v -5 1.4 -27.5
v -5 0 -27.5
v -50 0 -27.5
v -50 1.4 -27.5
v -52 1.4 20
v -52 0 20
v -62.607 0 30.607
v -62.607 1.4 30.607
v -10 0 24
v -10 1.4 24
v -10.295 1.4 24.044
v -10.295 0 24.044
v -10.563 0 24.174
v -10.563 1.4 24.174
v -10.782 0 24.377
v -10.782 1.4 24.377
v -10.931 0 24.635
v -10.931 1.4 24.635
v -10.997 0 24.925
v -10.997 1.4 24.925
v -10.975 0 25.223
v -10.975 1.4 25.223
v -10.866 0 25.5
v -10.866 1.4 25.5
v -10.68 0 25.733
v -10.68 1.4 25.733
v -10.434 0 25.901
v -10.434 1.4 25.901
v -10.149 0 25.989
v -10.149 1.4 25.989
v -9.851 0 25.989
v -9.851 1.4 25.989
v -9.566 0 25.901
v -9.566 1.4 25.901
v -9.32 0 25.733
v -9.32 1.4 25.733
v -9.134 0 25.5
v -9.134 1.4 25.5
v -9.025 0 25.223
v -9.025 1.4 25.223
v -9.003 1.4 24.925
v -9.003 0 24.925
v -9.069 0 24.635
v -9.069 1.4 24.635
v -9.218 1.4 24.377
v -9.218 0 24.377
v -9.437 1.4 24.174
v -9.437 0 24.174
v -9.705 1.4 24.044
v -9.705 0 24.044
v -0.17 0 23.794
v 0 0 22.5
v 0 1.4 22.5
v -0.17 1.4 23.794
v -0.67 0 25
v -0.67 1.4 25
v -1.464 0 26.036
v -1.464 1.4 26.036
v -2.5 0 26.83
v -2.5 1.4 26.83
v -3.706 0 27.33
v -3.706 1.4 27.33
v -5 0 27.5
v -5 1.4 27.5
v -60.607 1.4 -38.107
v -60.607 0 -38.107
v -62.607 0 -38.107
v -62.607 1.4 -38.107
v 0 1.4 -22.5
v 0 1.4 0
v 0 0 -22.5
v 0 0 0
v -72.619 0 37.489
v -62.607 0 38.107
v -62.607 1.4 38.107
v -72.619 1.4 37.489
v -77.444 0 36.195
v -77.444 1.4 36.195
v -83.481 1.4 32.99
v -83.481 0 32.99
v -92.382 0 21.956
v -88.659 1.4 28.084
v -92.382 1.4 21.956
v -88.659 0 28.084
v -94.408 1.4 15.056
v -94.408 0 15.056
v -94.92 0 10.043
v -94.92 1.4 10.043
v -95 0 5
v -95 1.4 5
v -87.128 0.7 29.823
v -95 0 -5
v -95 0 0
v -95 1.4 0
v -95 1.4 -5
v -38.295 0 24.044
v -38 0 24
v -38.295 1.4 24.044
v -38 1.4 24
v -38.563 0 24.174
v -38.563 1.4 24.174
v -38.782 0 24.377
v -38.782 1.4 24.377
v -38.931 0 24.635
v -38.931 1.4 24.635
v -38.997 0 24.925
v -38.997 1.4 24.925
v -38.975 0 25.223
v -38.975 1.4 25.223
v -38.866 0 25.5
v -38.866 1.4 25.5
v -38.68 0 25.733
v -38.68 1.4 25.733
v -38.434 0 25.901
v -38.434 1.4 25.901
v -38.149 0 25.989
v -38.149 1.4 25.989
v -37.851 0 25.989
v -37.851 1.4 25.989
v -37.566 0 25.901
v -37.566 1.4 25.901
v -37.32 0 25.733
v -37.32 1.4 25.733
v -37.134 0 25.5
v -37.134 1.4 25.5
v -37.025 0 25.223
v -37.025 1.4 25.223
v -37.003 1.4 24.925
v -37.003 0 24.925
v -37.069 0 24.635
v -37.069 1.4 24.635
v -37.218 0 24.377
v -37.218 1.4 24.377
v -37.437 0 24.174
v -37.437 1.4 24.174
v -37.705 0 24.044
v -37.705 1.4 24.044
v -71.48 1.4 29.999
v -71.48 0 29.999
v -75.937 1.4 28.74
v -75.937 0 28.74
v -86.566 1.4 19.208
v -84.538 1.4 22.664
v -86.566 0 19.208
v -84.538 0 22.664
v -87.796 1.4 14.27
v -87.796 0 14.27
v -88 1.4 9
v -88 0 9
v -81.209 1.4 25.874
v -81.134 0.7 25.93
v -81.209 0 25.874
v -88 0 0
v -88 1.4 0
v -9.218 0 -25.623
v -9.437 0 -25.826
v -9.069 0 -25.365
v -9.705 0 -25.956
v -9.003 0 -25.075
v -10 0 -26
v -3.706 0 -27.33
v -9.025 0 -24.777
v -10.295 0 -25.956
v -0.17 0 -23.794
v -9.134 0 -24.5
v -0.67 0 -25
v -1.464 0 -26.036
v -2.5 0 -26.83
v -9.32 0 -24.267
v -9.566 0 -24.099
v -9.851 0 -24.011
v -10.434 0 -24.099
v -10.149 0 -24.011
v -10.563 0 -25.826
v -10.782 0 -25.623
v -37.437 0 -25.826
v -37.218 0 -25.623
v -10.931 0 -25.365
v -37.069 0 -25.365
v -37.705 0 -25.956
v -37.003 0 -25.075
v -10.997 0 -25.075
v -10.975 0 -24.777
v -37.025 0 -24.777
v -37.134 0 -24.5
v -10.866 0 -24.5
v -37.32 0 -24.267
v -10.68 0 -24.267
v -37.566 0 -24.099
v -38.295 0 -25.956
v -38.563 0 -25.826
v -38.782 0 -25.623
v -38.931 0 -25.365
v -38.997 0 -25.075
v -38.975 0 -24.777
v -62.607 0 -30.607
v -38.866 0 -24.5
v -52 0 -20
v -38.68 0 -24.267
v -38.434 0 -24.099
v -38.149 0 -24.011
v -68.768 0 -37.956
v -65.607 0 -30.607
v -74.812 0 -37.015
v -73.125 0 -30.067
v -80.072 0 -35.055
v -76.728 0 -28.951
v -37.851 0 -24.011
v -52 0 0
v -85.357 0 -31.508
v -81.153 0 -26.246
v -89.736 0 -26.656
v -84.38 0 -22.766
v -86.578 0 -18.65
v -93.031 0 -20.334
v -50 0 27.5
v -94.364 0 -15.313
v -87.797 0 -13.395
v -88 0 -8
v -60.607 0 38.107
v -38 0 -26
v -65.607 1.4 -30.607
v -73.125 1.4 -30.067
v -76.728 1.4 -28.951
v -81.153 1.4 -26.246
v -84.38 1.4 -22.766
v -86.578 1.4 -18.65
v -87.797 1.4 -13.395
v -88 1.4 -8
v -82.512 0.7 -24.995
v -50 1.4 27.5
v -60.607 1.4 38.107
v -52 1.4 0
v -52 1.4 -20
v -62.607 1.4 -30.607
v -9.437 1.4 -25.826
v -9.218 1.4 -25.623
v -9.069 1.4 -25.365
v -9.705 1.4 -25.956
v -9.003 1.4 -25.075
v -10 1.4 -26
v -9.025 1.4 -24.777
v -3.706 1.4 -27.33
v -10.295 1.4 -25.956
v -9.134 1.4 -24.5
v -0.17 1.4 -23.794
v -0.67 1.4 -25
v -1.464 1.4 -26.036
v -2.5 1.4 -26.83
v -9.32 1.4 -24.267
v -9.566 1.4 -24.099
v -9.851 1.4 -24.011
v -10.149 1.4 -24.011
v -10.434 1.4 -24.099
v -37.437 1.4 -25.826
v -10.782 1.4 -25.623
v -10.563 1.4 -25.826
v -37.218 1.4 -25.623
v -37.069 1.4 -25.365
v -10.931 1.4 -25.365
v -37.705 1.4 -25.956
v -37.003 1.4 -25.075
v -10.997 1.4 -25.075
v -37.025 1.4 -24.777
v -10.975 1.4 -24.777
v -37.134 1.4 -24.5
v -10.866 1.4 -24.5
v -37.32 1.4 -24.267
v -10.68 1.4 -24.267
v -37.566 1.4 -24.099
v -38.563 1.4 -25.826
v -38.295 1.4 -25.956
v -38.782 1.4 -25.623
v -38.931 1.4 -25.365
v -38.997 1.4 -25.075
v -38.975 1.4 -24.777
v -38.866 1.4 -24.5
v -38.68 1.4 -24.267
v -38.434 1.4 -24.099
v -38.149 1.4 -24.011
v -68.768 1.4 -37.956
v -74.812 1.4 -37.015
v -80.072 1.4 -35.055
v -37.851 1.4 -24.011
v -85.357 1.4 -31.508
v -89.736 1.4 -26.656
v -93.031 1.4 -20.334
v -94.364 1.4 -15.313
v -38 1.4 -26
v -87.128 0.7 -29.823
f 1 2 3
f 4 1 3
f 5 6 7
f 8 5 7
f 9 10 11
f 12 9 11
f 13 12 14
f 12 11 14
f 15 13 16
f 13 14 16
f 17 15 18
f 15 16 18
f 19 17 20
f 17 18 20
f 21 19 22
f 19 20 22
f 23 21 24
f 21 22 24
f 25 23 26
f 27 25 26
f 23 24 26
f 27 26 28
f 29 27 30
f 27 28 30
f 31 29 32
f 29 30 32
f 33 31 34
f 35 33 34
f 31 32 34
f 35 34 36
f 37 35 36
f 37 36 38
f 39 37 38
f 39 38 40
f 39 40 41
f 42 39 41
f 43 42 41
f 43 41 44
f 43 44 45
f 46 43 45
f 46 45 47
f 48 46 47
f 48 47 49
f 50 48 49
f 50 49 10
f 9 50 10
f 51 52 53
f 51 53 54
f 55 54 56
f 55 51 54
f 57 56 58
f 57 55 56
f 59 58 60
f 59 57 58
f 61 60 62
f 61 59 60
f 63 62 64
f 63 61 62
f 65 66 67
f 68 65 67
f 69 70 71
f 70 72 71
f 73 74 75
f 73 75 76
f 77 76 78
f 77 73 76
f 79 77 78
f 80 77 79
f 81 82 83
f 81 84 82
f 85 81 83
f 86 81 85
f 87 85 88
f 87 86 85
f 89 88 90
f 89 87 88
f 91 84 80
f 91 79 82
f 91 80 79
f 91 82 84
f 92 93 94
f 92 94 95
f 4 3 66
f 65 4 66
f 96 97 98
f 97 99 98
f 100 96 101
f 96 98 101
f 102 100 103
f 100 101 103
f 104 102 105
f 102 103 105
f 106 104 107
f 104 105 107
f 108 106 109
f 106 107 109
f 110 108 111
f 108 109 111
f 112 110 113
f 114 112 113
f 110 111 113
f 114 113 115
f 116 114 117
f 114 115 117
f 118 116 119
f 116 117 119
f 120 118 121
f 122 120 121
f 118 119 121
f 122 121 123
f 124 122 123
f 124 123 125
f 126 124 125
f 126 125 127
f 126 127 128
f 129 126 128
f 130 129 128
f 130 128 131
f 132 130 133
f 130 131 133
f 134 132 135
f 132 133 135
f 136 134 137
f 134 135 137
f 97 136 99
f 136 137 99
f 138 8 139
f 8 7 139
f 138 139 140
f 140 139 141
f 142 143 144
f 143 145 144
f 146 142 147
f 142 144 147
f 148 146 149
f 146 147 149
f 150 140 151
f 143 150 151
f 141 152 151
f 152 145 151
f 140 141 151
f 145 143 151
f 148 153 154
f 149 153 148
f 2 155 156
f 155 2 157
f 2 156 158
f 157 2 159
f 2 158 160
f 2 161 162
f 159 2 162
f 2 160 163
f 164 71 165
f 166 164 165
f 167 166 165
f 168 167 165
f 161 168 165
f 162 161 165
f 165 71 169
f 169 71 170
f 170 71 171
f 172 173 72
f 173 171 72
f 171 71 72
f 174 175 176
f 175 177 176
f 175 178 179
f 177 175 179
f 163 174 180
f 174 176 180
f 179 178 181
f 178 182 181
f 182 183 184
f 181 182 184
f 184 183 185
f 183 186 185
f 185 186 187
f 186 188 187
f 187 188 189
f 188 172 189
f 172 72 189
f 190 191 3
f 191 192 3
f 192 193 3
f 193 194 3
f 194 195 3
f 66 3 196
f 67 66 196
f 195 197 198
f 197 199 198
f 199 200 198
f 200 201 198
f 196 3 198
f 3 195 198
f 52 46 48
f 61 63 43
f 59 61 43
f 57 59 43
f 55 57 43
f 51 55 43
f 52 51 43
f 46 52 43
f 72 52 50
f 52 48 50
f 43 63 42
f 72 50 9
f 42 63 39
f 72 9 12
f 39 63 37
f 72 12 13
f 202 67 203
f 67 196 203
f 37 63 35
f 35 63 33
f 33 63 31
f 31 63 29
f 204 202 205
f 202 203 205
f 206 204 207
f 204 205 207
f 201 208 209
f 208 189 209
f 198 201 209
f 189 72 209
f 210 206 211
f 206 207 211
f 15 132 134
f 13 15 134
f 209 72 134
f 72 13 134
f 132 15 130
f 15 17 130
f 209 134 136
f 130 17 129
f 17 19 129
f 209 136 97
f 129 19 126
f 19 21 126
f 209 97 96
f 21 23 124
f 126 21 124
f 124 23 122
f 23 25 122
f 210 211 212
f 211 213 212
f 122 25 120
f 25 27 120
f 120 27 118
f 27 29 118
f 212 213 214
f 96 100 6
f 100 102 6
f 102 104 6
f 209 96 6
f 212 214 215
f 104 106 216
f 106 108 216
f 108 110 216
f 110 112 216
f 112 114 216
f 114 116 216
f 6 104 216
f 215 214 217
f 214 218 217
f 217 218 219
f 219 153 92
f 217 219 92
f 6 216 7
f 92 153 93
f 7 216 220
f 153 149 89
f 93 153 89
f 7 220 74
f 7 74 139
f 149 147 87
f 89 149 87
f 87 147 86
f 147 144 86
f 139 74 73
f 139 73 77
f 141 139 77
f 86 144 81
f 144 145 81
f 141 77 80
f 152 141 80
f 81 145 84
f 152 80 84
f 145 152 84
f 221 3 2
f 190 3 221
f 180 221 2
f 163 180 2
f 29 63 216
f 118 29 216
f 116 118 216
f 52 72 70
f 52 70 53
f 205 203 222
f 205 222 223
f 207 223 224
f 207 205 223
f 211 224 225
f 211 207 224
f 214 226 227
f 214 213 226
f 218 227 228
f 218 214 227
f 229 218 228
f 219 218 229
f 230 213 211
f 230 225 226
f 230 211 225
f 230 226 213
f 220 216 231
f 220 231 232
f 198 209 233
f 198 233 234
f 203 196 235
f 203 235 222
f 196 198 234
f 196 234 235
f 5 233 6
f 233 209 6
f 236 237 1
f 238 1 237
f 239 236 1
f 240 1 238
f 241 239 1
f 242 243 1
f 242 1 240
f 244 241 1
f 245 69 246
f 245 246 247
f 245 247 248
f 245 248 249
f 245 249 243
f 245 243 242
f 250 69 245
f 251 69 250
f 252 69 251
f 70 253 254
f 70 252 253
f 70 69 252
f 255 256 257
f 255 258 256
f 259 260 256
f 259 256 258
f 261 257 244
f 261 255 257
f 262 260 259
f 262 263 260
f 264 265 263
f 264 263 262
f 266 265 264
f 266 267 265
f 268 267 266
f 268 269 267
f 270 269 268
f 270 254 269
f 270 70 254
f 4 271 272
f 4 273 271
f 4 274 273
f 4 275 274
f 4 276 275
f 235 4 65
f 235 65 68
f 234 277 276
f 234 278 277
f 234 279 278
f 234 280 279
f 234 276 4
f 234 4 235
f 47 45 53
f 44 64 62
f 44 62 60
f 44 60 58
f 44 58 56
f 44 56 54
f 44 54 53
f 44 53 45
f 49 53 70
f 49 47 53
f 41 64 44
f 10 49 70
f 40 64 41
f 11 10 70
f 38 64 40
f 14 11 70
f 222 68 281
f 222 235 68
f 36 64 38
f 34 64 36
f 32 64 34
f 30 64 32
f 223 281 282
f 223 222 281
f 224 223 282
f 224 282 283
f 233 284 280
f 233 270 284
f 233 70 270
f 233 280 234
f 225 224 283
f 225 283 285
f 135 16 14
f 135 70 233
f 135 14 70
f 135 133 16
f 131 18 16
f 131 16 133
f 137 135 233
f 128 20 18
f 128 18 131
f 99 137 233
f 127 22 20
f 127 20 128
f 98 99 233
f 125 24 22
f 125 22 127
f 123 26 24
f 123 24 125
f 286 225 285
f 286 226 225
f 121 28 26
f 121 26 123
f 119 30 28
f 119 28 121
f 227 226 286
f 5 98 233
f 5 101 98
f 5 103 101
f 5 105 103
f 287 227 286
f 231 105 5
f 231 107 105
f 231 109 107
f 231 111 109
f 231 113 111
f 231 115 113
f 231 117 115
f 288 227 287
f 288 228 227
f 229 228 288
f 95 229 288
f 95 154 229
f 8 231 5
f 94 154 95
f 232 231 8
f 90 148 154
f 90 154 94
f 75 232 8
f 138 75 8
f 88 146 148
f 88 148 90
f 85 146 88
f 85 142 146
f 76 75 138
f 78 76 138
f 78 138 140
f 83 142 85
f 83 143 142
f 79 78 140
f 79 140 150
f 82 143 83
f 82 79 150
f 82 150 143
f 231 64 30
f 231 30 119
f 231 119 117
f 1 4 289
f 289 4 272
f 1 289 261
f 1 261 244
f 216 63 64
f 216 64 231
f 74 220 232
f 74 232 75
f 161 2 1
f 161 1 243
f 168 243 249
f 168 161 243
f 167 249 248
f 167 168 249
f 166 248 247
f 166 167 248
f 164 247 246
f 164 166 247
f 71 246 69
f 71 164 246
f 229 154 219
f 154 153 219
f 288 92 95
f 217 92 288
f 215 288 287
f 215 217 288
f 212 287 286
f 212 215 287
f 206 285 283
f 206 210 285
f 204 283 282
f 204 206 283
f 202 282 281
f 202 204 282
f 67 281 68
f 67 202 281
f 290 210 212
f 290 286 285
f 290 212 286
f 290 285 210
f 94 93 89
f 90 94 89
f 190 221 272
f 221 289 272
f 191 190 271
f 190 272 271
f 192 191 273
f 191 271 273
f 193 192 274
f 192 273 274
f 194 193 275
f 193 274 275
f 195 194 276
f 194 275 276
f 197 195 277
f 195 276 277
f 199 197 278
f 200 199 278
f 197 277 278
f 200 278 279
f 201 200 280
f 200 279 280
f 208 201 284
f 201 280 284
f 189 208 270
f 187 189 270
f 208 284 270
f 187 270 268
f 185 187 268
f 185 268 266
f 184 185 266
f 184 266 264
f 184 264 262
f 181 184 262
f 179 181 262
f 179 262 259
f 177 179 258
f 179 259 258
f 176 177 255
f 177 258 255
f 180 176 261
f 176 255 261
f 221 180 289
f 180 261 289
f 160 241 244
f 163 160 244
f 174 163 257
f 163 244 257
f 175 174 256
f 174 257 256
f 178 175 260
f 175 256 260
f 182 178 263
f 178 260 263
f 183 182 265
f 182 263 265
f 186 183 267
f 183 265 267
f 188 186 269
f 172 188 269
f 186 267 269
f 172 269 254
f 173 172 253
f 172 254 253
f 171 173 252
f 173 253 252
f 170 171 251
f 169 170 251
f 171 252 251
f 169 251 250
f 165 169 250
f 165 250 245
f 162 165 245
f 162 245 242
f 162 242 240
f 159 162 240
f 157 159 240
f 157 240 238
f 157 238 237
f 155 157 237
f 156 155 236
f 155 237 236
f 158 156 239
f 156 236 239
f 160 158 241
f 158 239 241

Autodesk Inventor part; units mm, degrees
ref_plane "YZ Plane" through (0, 0, 0) normal (1, 0, 0) x (0, 1, 0)
ref_plane "XZ Plane" through (0, 0, 0) normal (0, 1, 0) x (-1, 0, 0)
ref_plane "XY Plane" through (0, 0, 0) normal (0, 0, 1) x (1, 0, 0)
sketch "Sketch1" plane through (0, 0, 0) normal (0, 1, 0) x (-1, 0, 0)
  line L0 (0, 0) -> (0, -22.5)
  line L1 (0, 0) -> (0, 22.5)
  line L2 (5, 27.5) -> (50, 27.5)
  line L3 (5, -27.5) -> (50, -27.5)
  line L4 (50, 27.5) -> (60.6066, 38.1066)
  line L5 (50, 27.5) -> (65, 27.5) construction
  line L6 (50, -27.5) -> (60.6066, -38.1066)
  line L7 (50, -27.5) -> (65, -27.5) construction
  line L8 (95, 0) -> (95, -5)
  line L9 (95, 0) -> (95, 5)
  arc A0 (5, 27.5) -> (0, 22.5) centre (5, 22.5) ccw
  arc A1 (0, -22.5) -> (5, -27.5) centre (5, -22.5) ccw
  line L10 (60.6066, 38.1066) -> (62.6066, 38.1066)
  line L11 (60.6066, -38.1066) -> (62.6066, -38.1066)
  spline S0 degree 4 poles (62.6066, 38.1066) (69.2667, 38.1066) (82.5868, 38.1066) (95, 24.8465) (95, 11.6155) (95, 5) knots 0 0 0 0 0 0.5 1 1 1 1 1
  spline S1 degree 4 poles (95, -5) (95, -11.6155) (95, -24.8465) (82.5868, -38.1066) (69.2667, -38.1066) (62.6066, -38.1066) knots 0 0 0 0 0 0.5 1 1 1 1 1
  line L12 (52, 0) -> (52, -20)
  line L13 (52, 0) -> (52, 20)
  line L14 (52, 20) -> (62.6066, 30.6066)
  line L15 (52, -20) -> (62.6066, -30.6066)
  line L16 (52, -20) -> (67, -20) construction
  line L17 (62.6066, 30.6066) -> (65.6066, 30.6066)
  line L18 (62.6066, -30.6066) -> (65.6066, -30.6066)
  line L19 (88, 0) -> (88, -8)
  line L20 (88, 0) -> (88, 9)
  spline S2 degree 4 poles (62.6066, 30.6066) (67.2711, 30.6066) (76.6001, 30.6066) (88, 23.7035) (88, 13.9012) (88, 9) knots 0 0 0 0 0 0.5 1 1 1 1 1
  spline S3 degree 4 poles (65.6066, -30.6066) (70.1733, -30.6066) (79.3067, -30.6066) (88, -21.6601) (88, -12.5534) (88, -8) knots 0 0 0 0 0 0.5 1 1 1 1 1
  point P0 (0, -27.5)
  point P1 (0, 27.5)
  point P2 (80, 0)
  point P3 (38, -25)
  point P4 (10, -25)
  point P5 (38, 25)
  point P6 (10, 25)
  dimension "d1" = 27.5
  dimension "d2" = 27.5
  dimension "d3" = 50
  dimension "d4" = 50
  dimension "d5" = 15
  dimension "d6" = 45
  dimension "d7" = 15
  dimension "d8" = 45
  dimension "d17" = 5
  dimension "d18" = 5
  dimension "d19" = 5
  dimension "d20" = 2
  dimension "d21" = 2
  dimension "d22" = 20
  dimension "d23" = 20
  dimension "d24" = 15
  dimension "d25" = 15
  dimension "d26" = 45
  dimension "d27" = 3
  dimension "d28" = 3
  dimension "d29" = 8
  dimension "d30" = 9
extrude "Extrusion1" add sketch "Sketch1" along normal blind 1.4
hole "Hole1" at (-38, 0, -25) at (-10, 0, -25) at (-38, 0, 25) at (-10, 0, 25) direction (0, 1, 0) diameter 2 depth 2 tip angle 118
properties part number "mainpcb-01"
